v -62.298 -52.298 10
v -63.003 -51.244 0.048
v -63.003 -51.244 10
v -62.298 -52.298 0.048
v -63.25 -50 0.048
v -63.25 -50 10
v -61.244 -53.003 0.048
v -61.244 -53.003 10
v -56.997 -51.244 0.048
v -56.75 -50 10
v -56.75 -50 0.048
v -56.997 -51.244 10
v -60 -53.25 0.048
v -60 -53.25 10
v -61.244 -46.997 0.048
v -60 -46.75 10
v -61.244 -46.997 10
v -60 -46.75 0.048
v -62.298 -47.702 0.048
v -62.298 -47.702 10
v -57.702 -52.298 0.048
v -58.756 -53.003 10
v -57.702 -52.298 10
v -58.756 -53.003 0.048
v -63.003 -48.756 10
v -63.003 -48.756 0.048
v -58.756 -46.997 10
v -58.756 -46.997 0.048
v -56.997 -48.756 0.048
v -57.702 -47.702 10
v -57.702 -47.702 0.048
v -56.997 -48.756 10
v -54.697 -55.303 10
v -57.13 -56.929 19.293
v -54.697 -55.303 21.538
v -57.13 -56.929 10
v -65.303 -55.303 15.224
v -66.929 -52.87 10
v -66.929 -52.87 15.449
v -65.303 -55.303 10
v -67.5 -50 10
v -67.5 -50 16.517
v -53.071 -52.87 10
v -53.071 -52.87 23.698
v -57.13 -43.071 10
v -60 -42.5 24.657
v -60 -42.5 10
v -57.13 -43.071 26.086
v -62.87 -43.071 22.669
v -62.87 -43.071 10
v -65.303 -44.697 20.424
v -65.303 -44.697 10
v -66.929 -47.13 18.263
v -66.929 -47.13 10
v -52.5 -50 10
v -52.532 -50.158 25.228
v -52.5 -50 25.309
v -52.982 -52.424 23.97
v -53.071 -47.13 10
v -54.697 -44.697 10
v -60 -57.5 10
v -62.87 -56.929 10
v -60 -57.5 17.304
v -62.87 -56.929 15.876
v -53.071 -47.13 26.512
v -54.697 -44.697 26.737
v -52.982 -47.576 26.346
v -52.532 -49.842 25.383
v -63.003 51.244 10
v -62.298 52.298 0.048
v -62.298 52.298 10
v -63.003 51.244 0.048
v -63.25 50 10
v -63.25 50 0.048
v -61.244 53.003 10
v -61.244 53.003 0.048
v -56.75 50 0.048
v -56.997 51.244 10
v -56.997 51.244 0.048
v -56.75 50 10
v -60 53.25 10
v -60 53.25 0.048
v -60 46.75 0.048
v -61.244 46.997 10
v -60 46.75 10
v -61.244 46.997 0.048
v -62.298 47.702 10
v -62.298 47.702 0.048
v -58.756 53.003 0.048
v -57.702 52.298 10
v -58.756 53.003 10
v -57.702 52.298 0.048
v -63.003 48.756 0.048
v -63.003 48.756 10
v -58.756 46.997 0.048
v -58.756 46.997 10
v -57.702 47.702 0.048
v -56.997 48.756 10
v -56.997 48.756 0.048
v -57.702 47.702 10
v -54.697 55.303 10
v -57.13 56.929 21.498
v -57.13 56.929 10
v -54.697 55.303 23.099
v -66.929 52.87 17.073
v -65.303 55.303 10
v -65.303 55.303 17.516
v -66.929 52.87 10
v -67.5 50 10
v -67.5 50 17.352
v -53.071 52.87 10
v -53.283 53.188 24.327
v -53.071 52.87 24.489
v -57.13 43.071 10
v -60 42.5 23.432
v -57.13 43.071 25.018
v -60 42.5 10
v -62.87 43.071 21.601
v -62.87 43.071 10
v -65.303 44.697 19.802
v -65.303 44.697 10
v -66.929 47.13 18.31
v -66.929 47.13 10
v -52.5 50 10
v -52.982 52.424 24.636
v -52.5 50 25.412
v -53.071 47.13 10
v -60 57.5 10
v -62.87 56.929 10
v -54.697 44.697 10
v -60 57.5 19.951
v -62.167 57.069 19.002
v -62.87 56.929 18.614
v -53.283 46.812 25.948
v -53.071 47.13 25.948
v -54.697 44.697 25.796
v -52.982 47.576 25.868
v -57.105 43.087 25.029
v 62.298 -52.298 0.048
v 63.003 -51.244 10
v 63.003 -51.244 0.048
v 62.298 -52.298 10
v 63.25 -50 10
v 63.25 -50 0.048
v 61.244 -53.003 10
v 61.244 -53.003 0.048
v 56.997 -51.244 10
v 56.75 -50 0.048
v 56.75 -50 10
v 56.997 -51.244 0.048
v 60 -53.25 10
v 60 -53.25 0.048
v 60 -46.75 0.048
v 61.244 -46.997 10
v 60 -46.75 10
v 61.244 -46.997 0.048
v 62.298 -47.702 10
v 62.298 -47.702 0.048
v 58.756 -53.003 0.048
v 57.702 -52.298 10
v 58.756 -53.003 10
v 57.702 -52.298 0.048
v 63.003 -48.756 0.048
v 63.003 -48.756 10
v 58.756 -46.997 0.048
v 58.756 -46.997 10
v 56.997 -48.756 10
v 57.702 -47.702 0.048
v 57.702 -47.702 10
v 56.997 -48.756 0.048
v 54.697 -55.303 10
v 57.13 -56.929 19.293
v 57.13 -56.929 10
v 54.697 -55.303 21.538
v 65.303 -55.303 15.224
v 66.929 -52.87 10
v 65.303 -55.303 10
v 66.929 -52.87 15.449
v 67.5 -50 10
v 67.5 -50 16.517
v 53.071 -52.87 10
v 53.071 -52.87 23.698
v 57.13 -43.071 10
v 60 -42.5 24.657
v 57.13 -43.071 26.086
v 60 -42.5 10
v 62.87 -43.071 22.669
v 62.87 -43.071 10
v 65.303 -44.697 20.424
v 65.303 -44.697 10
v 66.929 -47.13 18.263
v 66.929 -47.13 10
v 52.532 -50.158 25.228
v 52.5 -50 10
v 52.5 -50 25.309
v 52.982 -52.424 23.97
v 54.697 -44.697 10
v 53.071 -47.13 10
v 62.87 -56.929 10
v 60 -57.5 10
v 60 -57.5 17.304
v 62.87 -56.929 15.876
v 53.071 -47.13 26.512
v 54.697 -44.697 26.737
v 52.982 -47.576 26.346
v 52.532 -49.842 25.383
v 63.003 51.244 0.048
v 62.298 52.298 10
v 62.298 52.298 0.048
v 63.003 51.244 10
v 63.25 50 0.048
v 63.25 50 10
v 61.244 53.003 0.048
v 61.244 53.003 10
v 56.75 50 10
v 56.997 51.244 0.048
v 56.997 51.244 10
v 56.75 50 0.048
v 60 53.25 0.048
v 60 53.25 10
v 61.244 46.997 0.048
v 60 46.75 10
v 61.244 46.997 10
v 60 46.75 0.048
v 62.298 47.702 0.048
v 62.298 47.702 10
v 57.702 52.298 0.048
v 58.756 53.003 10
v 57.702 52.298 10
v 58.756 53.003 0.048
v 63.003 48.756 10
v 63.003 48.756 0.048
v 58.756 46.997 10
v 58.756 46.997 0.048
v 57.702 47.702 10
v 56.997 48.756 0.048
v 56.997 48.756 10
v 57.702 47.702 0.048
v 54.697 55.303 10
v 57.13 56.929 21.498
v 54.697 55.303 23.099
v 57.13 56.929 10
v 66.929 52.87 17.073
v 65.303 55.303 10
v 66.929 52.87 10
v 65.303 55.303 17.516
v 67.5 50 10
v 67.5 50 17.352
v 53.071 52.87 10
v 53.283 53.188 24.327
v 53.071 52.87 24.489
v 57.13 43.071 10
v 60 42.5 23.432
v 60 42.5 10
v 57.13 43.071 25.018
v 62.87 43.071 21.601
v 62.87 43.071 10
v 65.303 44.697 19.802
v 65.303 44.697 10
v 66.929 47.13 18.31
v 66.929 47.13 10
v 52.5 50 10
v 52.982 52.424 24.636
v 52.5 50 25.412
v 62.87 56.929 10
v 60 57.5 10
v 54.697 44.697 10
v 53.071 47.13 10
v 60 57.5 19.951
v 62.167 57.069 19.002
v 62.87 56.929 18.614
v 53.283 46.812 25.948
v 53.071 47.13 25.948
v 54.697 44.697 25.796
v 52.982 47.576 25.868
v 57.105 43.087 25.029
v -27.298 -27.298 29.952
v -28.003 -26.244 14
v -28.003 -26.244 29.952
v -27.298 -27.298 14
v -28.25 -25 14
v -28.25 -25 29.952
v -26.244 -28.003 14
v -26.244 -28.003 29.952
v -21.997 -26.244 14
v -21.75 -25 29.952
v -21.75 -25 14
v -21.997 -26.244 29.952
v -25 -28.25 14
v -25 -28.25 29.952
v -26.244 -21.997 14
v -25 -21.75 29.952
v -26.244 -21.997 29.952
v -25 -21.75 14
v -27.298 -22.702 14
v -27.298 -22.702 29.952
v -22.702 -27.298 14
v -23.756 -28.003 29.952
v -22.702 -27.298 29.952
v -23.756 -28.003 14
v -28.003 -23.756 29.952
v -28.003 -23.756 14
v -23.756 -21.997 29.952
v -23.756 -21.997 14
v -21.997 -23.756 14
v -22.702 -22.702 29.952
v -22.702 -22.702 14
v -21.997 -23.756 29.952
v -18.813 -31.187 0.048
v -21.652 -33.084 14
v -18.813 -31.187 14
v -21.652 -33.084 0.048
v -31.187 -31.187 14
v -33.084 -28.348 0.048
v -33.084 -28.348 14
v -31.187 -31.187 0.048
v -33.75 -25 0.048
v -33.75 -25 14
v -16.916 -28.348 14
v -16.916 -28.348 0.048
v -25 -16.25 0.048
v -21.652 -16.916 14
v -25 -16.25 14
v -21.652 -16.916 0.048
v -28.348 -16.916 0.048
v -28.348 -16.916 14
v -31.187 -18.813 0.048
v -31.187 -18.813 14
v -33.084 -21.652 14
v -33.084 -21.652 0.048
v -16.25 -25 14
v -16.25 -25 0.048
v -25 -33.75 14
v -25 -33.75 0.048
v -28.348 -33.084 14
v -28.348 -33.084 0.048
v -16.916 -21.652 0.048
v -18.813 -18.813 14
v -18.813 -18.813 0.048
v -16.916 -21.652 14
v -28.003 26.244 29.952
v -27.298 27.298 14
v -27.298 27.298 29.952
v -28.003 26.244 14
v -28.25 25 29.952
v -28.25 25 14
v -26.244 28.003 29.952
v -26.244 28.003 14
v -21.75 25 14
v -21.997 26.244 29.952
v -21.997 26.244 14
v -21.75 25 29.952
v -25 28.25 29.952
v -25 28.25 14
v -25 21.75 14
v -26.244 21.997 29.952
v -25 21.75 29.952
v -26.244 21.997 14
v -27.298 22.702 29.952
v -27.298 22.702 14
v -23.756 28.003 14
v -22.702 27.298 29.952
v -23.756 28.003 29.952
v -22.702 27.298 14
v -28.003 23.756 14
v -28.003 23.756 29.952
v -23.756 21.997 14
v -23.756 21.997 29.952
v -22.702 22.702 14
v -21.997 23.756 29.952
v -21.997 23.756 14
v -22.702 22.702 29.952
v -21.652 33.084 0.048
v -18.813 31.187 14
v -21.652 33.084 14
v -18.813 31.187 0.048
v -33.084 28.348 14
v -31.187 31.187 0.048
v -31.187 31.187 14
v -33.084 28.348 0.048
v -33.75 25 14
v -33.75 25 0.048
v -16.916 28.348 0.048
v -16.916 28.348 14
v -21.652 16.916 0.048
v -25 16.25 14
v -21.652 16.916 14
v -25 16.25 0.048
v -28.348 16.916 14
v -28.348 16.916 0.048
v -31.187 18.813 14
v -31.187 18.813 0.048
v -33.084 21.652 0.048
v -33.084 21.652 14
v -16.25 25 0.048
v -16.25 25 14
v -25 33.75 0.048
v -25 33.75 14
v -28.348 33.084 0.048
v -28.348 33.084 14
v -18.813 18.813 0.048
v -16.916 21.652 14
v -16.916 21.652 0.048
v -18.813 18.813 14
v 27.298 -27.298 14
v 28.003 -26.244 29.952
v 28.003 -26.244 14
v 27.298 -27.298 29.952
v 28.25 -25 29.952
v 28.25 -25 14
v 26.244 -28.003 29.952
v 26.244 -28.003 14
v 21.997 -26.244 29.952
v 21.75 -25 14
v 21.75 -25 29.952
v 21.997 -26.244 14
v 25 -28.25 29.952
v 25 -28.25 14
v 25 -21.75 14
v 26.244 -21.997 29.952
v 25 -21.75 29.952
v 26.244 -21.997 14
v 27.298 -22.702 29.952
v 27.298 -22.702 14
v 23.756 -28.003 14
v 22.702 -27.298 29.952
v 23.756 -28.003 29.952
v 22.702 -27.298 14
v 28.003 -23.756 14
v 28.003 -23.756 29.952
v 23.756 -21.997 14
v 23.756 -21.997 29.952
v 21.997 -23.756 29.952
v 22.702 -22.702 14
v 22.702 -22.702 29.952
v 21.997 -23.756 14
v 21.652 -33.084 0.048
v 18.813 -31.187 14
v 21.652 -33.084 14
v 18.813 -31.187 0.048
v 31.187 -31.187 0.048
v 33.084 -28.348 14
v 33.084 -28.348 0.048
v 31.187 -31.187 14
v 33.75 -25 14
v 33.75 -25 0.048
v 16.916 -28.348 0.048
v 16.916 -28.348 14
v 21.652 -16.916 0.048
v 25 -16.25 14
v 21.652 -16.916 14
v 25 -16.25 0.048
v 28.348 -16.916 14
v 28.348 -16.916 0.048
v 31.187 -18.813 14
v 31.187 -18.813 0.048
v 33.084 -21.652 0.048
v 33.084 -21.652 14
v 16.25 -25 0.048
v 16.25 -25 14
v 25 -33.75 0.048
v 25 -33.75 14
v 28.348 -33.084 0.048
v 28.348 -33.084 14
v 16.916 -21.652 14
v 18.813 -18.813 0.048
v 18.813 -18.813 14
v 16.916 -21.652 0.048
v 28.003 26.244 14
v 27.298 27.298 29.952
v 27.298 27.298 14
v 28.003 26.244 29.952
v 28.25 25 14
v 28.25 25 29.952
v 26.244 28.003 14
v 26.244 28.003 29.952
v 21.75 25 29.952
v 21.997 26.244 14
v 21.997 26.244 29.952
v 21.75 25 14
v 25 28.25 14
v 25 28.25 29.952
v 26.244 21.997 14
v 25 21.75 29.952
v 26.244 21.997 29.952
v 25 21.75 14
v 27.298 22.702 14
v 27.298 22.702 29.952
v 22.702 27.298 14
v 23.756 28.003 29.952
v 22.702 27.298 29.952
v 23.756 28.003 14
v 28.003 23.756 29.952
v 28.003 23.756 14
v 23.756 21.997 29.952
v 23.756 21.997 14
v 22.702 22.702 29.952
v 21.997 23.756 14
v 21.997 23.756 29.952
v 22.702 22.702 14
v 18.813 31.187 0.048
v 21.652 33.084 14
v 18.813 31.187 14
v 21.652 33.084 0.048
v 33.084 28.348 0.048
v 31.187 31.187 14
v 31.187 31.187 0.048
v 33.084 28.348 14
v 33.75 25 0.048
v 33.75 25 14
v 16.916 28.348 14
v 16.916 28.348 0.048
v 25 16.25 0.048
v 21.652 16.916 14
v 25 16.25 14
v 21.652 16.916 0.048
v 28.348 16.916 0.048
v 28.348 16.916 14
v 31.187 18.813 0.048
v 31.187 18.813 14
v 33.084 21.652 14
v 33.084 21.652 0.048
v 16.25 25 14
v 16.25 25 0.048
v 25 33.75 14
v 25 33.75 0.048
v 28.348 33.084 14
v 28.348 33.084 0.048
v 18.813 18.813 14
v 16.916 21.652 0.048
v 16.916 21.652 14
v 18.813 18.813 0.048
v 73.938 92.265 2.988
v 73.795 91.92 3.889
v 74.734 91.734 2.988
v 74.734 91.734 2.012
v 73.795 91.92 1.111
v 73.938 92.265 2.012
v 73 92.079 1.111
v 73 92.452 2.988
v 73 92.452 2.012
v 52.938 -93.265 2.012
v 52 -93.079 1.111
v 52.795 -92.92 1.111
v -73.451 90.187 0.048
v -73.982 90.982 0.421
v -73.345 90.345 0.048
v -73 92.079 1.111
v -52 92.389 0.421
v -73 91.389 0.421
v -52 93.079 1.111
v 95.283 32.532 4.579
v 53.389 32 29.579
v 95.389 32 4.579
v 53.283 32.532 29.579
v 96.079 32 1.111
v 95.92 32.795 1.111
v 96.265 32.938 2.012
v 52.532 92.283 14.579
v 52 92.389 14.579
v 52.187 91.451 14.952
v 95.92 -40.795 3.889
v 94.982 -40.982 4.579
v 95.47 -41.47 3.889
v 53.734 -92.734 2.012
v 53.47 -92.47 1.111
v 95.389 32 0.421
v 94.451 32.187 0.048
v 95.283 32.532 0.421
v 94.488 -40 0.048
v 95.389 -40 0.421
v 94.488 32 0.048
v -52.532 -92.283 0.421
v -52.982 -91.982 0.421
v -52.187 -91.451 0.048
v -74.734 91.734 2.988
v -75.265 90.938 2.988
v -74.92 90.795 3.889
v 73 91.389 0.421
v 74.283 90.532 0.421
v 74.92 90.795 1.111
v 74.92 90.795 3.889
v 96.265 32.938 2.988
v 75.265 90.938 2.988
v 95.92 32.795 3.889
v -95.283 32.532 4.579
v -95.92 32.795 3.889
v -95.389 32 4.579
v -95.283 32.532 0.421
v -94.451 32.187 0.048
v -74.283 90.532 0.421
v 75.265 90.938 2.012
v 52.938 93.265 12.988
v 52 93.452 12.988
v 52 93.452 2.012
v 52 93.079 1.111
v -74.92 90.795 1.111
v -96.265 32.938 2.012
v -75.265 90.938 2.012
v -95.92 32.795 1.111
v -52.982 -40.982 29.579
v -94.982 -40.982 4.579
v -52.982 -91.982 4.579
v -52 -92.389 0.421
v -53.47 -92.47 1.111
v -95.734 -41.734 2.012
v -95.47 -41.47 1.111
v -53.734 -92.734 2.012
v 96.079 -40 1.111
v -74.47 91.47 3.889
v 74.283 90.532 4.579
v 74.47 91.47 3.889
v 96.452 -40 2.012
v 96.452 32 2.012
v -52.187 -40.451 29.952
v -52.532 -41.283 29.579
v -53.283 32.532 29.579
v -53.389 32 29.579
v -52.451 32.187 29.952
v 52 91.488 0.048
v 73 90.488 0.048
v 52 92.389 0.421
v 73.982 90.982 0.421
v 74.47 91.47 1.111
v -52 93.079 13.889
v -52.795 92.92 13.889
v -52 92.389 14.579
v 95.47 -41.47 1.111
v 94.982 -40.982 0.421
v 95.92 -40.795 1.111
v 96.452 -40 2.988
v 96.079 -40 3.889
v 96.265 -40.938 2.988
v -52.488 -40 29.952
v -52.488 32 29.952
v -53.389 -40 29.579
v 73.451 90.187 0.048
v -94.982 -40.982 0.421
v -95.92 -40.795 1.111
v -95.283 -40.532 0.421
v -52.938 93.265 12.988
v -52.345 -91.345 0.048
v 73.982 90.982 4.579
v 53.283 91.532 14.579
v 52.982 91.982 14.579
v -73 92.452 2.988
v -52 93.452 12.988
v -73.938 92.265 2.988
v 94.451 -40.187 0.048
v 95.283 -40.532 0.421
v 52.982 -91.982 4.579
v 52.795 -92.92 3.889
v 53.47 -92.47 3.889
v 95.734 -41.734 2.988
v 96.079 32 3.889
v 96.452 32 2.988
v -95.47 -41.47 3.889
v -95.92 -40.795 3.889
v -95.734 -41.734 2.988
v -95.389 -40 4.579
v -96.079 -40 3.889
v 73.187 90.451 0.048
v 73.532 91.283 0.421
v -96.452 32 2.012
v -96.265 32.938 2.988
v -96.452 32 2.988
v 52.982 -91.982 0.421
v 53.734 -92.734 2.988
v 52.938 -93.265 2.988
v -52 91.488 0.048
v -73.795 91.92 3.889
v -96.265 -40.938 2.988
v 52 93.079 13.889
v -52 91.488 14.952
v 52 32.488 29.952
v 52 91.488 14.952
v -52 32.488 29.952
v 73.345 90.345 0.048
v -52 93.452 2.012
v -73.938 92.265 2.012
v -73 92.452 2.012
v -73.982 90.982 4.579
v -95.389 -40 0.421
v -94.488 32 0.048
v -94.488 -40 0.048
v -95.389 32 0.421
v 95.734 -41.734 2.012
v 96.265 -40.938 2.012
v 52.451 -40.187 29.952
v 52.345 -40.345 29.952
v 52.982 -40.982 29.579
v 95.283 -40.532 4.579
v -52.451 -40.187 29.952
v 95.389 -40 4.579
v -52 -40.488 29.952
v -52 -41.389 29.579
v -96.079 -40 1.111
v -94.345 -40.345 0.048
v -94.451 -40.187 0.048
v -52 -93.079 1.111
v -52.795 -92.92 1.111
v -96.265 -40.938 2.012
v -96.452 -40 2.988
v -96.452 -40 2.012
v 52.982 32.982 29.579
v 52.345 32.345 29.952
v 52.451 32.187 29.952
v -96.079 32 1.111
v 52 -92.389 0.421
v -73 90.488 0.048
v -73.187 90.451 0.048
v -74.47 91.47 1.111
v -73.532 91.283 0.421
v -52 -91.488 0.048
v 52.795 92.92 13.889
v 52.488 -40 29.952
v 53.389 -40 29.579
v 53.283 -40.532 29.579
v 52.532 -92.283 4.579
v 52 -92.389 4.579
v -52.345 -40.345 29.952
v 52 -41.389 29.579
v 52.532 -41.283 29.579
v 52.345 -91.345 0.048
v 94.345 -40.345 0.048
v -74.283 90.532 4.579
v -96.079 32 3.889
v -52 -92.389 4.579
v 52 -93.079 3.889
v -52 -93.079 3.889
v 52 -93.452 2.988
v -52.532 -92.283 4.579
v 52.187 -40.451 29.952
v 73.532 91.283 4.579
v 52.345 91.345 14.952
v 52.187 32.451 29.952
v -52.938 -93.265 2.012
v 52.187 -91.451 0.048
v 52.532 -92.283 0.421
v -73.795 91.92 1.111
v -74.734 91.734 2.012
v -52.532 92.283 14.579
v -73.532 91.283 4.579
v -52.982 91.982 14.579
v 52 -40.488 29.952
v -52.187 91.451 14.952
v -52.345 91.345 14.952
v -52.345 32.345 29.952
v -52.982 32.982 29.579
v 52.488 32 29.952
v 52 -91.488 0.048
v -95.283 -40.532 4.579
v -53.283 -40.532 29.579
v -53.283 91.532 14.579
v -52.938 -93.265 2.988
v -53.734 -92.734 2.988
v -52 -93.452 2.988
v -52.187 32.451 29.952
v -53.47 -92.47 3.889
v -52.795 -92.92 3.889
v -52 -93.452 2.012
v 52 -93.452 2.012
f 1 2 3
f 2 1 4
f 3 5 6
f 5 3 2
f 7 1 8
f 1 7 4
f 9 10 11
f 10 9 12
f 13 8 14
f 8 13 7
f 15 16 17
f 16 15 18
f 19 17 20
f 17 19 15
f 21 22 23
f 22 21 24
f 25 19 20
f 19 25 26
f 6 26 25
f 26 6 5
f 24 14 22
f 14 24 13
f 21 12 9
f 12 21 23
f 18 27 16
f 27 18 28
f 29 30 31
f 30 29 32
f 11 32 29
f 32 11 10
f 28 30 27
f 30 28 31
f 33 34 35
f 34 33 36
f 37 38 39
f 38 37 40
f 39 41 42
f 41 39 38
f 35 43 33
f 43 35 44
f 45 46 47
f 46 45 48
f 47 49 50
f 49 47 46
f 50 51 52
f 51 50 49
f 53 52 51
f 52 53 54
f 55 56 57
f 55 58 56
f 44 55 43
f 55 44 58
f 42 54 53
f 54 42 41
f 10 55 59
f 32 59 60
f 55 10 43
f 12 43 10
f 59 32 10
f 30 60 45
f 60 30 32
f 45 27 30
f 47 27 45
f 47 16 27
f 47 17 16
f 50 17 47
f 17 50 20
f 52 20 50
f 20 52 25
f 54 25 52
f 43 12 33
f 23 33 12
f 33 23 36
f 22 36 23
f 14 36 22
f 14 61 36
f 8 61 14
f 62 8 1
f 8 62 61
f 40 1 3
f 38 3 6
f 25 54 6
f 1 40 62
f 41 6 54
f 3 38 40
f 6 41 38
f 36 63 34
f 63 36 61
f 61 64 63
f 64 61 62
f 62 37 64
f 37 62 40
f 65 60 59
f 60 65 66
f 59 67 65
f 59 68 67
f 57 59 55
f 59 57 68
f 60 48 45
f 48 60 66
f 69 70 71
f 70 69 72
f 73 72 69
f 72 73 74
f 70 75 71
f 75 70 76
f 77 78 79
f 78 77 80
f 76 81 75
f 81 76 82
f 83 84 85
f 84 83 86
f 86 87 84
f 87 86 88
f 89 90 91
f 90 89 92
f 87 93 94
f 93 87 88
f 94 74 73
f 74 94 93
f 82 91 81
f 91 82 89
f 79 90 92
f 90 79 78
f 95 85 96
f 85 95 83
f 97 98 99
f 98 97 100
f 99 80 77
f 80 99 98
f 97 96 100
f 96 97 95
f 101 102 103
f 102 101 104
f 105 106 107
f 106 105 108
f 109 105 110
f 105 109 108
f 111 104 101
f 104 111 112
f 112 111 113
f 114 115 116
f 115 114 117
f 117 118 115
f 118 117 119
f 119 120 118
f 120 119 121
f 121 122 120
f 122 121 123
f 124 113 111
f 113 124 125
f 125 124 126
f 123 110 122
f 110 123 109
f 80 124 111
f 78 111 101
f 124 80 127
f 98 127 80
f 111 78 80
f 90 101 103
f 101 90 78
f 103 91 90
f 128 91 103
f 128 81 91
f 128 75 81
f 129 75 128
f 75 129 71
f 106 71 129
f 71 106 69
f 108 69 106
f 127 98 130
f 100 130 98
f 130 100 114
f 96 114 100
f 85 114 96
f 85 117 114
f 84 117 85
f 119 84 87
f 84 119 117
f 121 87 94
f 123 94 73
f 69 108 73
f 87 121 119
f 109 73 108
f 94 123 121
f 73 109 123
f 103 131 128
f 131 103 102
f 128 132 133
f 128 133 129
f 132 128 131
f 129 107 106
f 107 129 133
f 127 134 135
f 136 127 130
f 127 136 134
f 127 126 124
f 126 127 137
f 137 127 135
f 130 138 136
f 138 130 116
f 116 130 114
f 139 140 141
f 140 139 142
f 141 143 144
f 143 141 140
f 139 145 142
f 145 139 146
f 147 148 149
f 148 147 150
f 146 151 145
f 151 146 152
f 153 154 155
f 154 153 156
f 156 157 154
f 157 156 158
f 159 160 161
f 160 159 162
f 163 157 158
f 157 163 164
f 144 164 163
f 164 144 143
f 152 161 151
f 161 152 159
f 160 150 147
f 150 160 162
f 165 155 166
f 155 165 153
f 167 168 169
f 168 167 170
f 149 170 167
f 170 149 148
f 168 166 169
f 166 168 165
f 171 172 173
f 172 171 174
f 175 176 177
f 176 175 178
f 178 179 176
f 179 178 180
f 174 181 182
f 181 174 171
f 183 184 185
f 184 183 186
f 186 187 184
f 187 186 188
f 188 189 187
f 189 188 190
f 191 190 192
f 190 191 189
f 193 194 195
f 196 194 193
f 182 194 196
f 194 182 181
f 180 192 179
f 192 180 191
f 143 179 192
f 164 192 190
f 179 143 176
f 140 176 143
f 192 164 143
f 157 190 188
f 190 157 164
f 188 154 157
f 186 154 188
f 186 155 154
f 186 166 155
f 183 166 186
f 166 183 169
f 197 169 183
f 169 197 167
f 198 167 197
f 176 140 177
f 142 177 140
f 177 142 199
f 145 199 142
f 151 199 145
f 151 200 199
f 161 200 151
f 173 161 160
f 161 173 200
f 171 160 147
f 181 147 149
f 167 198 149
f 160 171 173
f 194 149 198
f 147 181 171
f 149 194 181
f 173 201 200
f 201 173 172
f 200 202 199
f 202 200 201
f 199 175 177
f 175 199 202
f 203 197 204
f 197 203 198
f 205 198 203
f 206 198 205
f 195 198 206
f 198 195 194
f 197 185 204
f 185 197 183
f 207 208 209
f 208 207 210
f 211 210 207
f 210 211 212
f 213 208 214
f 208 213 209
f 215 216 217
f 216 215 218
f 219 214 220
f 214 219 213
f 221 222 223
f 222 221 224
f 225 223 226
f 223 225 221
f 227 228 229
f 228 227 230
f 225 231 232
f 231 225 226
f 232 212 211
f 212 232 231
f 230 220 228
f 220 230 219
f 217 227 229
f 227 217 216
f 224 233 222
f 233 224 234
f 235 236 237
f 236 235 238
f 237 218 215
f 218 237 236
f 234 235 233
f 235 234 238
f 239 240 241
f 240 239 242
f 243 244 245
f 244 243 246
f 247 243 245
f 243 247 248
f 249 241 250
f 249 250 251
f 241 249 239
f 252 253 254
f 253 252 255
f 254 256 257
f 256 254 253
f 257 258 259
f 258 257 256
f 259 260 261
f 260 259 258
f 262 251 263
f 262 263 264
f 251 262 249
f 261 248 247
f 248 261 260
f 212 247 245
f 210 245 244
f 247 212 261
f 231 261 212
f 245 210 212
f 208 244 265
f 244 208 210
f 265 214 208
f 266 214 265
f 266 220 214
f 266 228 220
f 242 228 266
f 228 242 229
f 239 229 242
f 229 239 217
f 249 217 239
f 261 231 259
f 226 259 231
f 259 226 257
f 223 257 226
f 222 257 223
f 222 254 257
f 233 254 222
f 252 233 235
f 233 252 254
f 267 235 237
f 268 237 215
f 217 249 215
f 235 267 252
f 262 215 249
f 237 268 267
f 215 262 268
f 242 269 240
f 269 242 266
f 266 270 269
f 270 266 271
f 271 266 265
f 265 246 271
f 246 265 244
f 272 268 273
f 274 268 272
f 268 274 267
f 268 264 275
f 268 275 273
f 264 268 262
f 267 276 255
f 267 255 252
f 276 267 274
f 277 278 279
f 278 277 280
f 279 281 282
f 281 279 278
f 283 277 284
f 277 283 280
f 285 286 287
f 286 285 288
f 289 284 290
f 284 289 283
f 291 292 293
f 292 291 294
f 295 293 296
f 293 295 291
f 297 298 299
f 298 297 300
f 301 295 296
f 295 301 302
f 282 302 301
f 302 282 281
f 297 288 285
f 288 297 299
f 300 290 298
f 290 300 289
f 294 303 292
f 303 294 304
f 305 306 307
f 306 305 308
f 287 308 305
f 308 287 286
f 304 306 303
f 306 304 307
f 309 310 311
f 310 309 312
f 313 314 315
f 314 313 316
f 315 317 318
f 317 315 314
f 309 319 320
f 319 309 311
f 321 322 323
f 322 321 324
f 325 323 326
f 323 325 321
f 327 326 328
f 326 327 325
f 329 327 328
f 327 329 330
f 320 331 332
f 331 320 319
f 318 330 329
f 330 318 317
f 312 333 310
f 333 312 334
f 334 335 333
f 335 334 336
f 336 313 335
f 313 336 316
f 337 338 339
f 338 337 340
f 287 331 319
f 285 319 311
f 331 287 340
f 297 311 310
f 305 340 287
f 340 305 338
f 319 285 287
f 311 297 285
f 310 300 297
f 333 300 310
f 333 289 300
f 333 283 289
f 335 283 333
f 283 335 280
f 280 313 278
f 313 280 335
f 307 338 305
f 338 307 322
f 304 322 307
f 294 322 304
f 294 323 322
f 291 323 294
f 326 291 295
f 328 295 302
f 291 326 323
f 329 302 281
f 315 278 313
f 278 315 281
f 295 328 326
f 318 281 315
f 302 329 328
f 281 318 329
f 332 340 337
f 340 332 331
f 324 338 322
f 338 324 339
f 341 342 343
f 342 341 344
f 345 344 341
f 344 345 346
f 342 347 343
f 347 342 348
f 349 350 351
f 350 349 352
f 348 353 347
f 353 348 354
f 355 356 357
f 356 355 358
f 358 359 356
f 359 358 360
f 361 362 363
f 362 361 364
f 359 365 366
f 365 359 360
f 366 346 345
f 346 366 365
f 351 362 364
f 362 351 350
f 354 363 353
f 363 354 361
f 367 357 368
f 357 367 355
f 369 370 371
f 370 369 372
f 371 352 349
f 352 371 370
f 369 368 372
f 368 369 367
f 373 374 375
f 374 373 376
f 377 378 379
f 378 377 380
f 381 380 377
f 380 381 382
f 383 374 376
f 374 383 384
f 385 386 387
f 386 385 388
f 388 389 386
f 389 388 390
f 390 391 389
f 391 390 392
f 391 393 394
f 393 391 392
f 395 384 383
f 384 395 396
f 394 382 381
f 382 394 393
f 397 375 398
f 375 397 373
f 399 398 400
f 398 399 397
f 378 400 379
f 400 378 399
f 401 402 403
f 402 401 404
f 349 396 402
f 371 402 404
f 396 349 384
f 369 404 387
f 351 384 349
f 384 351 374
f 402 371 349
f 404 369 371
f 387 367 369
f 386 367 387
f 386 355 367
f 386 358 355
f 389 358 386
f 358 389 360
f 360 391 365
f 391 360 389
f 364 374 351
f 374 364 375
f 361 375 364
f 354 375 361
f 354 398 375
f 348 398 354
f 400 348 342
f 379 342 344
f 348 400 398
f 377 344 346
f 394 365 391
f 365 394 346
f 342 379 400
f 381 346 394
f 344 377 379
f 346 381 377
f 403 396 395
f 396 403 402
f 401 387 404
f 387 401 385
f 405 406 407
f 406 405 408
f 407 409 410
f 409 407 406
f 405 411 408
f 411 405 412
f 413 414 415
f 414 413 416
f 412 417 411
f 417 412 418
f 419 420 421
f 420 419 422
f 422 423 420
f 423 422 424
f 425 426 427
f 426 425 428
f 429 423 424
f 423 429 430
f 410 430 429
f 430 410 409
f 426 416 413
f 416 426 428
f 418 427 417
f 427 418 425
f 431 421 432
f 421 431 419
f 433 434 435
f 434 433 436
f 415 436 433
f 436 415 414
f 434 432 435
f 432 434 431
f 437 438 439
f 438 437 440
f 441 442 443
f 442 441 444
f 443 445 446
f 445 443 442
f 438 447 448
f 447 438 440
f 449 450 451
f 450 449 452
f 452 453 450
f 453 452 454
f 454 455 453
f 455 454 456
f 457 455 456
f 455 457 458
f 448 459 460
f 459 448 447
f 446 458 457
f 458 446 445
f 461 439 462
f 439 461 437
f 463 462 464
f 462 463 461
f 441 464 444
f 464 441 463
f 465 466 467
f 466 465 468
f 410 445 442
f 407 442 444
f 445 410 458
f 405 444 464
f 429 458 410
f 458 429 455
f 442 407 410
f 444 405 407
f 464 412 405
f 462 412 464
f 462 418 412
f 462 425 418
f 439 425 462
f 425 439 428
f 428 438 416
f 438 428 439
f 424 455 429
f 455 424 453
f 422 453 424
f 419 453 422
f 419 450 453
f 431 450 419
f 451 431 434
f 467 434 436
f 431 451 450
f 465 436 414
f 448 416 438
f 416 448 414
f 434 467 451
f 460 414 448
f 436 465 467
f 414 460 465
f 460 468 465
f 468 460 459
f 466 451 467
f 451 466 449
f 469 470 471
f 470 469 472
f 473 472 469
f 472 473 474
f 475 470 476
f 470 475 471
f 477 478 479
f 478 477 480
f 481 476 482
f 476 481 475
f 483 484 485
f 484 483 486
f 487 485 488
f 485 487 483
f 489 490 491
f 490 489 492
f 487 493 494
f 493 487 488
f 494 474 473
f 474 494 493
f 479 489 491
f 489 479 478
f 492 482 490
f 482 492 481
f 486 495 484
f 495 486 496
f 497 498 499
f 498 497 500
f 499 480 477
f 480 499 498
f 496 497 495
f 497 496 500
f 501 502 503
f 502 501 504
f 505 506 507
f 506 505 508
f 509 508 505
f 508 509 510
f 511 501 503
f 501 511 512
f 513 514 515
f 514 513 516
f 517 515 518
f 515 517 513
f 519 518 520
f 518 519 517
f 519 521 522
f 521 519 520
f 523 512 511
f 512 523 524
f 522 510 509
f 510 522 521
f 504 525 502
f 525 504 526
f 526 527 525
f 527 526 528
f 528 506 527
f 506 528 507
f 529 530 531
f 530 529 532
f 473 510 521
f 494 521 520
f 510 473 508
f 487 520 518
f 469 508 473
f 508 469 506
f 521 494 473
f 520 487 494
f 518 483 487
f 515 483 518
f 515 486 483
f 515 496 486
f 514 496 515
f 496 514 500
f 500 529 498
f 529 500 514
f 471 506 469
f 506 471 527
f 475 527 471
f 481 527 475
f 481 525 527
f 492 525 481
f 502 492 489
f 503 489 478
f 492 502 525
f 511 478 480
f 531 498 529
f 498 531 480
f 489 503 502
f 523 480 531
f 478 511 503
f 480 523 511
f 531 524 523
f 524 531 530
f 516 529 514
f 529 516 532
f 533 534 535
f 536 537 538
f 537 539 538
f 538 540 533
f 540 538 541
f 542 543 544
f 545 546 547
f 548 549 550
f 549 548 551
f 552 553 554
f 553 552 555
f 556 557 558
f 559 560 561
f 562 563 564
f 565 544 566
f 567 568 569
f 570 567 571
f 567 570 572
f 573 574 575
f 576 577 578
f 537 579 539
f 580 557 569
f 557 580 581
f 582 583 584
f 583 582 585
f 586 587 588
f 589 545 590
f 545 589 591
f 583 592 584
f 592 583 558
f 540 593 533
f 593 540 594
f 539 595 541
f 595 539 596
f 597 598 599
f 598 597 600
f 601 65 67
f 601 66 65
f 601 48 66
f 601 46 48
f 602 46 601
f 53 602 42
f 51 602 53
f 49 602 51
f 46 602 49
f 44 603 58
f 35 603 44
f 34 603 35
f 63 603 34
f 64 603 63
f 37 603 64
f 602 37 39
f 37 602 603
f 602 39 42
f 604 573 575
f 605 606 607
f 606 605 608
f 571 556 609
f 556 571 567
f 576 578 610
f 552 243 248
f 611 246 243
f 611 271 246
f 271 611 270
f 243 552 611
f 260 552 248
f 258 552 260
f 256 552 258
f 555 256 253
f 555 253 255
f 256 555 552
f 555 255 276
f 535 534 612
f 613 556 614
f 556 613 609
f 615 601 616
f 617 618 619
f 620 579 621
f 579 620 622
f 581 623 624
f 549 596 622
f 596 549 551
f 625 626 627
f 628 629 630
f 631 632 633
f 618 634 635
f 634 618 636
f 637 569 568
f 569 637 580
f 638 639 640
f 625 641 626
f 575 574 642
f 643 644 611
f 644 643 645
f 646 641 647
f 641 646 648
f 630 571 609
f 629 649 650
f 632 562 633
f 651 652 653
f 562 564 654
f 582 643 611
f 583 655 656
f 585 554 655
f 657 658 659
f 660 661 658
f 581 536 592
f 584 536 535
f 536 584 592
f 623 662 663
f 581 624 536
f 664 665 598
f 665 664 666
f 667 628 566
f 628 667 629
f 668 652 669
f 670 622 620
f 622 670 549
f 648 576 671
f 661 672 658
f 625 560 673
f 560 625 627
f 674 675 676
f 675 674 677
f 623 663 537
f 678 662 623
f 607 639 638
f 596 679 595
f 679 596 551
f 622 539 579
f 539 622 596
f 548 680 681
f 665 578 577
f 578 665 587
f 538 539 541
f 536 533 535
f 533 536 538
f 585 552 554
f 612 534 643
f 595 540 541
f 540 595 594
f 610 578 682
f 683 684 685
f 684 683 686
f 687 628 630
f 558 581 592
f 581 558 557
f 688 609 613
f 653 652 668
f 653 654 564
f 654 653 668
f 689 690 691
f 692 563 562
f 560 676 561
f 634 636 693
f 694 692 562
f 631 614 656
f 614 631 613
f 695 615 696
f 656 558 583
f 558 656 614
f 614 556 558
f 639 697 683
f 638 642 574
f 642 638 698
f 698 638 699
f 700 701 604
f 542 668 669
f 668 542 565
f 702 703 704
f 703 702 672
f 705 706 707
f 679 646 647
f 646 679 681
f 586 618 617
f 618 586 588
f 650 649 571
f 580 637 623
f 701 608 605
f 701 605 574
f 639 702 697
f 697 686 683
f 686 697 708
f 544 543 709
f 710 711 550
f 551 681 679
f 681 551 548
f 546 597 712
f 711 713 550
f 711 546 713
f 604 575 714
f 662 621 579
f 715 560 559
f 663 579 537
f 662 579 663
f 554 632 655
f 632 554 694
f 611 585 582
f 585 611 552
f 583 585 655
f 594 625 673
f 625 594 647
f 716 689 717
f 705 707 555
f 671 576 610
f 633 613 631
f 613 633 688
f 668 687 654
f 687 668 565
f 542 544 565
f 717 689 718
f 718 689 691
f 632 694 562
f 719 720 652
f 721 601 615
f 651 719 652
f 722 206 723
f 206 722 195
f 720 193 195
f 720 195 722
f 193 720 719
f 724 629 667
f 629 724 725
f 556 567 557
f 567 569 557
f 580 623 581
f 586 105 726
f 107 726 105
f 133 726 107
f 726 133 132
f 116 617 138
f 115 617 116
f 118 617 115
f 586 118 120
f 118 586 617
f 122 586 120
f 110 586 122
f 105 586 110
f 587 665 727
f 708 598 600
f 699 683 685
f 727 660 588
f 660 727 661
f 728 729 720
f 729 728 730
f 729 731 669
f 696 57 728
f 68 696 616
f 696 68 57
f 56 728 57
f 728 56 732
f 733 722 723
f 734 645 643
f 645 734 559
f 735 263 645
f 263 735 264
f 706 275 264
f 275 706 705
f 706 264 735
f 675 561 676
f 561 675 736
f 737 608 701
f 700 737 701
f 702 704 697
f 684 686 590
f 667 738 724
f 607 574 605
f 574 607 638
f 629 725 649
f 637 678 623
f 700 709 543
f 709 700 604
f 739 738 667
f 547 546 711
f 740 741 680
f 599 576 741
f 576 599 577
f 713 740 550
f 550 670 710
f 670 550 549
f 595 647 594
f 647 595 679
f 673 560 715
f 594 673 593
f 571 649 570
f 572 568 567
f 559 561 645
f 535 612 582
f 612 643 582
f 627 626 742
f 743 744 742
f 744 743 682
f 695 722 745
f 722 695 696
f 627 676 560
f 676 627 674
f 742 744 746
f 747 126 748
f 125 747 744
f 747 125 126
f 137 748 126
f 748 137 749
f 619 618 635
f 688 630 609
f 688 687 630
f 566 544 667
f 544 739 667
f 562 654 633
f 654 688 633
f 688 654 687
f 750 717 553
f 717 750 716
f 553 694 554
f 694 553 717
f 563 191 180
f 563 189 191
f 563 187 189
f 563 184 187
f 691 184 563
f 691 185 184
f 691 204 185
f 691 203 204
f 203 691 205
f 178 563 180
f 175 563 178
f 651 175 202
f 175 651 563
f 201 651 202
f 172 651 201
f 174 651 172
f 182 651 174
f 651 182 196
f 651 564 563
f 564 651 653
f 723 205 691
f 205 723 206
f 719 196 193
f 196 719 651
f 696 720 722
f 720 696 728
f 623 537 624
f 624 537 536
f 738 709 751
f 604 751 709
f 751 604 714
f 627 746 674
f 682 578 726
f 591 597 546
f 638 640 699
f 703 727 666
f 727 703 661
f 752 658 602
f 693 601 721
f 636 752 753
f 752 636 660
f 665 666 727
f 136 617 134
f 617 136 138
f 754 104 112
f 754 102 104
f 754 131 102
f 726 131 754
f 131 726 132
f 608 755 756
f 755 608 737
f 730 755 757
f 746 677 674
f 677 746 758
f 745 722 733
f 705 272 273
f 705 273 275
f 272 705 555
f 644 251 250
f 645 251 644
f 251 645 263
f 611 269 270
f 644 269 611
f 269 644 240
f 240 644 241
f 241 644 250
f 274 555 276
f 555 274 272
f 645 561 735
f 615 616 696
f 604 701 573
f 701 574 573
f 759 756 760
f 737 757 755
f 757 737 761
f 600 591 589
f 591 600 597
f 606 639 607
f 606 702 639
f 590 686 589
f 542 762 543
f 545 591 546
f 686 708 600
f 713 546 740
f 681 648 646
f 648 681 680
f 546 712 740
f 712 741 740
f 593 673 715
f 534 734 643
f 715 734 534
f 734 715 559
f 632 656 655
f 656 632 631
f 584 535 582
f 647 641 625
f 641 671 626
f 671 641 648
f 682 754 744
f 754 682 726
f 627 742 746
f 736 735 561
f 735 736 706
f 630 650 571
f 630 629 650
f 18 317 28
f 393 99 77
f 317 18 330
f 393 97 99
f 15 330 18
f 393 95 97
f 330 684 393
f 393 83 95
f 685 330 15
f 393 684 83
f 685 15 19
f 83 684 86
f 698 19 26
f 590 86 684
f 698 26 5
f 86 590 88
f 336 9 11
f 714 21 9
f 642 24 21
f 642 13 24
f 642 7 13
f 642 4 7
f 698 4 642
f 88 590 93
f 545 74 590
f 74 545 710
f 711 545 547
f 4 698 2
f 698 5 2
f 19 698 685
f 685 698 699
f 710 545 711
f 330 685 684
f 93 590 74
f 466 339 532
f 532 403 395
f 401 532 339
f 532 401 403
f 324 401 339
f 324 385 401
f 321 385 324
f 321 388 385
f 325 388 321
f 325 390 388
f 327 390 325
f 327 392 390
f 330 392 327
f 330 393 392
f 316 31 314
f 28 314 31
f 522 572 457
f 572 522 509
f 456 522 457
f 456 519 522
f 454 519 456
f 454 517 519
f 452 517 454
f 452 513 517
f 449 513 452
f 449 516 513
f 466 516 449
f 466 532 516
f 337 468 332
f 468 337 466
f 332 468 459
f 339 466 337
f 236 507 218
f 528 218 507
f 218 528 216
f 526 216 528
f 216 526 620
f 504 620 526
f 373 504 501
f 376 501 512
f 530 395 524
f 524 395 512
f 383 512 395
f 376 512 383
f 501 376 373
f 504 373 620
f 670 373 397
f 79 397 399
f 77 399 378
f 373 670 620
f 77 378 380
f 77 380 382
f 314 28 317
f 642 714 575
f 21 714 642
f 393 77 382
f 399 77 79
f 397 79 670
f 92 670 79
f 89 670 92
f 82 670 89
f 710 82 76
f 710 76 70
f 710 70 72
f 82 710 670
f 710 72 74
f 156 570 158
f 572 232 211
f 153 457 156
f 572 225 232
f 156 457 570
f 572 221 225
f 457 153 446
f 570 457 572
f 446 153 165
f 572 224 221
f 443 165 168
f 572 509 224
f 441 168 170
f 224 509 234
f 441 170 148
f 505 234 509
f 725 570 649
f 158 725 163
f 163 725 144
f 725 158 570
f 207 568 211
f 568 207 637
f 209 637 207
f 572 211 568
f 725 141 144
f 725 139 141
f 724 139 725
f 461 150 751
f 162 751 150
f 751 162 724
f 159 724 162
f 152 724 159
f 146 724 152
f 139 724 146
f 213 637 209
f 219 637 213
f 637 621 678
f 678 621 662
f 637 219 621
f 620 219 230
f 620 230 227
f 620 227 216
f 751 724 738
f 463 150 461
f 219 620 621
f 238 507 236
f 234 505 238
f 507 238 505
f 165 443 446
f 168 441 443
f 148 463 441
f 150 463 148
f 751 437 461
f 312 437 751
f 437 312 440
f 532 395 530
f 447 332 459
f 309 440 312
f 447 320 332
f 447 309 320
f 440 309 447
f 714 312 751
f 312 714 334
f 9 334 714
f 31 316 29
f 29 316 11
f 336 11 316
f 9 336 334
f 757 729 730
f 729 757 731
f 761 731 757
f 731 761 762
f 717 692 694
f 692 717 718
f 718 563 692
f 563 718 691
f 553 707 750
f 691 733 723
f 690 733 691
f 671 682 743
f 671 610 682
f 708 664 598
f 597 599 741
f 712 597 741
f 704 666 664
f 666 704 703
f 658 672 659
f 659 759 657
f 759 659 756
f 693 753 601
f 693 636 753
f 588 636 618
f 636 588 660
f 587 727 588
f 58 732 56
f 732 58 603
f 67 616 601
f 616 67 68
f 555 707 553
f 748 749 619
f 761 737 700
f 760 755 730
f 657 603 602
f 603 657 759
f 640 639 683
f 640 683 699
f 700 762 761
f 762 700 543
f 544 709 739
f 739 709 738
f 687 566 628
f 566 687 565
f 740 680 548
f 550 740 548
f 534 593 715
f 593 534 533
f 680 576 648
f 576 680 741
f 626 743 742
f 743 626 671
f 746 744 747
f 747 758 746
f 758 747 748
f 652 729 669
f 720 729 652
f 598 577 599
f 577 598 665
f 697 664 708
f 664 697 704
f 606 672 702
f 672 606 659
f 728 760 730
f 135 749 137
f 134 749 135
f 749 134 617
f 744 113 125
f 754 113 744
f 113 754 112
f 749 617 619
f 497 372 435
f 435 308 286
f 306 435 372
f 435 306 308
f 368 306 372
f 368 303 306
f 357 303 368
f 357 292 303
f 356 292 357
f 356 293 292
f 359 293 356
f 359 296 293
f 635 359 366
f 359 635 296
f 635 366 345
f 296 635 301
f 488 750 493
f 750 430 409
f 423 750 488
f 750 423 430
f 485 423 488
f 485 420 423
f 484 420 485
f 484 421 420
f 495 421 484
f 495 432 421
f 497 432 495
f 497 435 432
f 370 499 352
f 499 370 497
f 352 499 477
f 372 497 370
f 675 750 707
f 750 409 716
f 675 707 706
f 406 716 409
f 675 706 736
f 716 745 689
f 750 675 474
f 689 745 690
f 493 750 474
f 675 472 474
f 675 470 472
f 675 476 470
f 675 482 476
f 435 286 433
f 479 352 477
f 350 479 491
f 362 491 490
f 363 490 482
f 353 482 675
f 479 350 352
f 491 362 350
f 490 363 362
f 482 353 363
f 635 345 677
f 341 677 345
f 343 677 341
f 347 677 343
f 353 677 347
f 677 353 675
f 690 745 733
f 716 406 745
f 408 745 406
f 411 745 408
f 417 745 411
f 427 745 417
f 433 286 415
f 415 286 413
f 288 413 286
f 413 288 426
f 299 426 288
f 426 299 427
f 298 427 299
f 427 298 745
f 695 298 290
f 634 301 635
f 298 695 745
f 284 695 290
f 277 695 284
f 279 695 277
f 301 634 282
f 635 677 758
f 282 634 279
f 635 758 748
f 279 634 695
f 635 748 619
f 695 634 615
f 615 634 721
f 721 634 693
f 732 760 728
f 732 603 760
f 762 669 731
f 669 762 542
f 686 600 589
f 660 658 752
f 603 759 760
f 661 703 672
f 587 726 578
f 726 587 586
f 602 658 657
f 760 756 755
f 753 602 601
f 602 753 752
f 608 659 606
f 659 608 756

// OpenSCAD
$fn = 16;
rounding = 2.5;

// TODO: measure this IRL
top_height = 25;
mid_height = 10;

height=200;
extrusion_width=30;
extrusion_bolt_dia=6.5;
extrusion_bolt_dist=200;

// coords traced out of image
difference(){
	translate([0,0,rounding])hull(){
		for(x=[-1:2:1])scale([x,1]){
			translate([-73,90])sphere(r=rounding);
			translate([-94,32])sphere(r=rounding);
			translate([-94,-40])sphere(r=rounding);
			translate([-52,-91])sphere(r=rounding);
			translate([-52,91])sphere(r=rounding);

			translate([0,0,mid_height]){
				translate([-52,91])sphere(r=rounding);
			}
			
			translate([0,0,top_height]){
				translate([-52,32])sphere(r=rounding);
				translate([-52,-40])sphere(r=rounding);
			}
		}
	}

	for(x=[-1:2:1])for(y=[-1:2:1])scale([x,y])
		translate([extrusion_bolt_dist/2-40,50]){
			translate([0,0,-1])cylinder(d=extrusion_bolt_dia,h=30);
			translate([0,0,10])cylinder(d=15,h=30);
		}

	for(x=[-1:2:1])for(y=[-1:2:1])scale([x,y])
		translate([25,25]){
			translate([0,0,-1])cylinder(d=extrusion_bolt_dia,h=40);
			translate([0,0,-1])cylinder(d=17.5,h=15);
		}
}

%for(x=[-1:2:1])scale([x,-1])translate([extrusion_bolt_dist/2-40,0,-extrusion_width/2])cube([extrusion_width,height,extrusion_width],center=true);
